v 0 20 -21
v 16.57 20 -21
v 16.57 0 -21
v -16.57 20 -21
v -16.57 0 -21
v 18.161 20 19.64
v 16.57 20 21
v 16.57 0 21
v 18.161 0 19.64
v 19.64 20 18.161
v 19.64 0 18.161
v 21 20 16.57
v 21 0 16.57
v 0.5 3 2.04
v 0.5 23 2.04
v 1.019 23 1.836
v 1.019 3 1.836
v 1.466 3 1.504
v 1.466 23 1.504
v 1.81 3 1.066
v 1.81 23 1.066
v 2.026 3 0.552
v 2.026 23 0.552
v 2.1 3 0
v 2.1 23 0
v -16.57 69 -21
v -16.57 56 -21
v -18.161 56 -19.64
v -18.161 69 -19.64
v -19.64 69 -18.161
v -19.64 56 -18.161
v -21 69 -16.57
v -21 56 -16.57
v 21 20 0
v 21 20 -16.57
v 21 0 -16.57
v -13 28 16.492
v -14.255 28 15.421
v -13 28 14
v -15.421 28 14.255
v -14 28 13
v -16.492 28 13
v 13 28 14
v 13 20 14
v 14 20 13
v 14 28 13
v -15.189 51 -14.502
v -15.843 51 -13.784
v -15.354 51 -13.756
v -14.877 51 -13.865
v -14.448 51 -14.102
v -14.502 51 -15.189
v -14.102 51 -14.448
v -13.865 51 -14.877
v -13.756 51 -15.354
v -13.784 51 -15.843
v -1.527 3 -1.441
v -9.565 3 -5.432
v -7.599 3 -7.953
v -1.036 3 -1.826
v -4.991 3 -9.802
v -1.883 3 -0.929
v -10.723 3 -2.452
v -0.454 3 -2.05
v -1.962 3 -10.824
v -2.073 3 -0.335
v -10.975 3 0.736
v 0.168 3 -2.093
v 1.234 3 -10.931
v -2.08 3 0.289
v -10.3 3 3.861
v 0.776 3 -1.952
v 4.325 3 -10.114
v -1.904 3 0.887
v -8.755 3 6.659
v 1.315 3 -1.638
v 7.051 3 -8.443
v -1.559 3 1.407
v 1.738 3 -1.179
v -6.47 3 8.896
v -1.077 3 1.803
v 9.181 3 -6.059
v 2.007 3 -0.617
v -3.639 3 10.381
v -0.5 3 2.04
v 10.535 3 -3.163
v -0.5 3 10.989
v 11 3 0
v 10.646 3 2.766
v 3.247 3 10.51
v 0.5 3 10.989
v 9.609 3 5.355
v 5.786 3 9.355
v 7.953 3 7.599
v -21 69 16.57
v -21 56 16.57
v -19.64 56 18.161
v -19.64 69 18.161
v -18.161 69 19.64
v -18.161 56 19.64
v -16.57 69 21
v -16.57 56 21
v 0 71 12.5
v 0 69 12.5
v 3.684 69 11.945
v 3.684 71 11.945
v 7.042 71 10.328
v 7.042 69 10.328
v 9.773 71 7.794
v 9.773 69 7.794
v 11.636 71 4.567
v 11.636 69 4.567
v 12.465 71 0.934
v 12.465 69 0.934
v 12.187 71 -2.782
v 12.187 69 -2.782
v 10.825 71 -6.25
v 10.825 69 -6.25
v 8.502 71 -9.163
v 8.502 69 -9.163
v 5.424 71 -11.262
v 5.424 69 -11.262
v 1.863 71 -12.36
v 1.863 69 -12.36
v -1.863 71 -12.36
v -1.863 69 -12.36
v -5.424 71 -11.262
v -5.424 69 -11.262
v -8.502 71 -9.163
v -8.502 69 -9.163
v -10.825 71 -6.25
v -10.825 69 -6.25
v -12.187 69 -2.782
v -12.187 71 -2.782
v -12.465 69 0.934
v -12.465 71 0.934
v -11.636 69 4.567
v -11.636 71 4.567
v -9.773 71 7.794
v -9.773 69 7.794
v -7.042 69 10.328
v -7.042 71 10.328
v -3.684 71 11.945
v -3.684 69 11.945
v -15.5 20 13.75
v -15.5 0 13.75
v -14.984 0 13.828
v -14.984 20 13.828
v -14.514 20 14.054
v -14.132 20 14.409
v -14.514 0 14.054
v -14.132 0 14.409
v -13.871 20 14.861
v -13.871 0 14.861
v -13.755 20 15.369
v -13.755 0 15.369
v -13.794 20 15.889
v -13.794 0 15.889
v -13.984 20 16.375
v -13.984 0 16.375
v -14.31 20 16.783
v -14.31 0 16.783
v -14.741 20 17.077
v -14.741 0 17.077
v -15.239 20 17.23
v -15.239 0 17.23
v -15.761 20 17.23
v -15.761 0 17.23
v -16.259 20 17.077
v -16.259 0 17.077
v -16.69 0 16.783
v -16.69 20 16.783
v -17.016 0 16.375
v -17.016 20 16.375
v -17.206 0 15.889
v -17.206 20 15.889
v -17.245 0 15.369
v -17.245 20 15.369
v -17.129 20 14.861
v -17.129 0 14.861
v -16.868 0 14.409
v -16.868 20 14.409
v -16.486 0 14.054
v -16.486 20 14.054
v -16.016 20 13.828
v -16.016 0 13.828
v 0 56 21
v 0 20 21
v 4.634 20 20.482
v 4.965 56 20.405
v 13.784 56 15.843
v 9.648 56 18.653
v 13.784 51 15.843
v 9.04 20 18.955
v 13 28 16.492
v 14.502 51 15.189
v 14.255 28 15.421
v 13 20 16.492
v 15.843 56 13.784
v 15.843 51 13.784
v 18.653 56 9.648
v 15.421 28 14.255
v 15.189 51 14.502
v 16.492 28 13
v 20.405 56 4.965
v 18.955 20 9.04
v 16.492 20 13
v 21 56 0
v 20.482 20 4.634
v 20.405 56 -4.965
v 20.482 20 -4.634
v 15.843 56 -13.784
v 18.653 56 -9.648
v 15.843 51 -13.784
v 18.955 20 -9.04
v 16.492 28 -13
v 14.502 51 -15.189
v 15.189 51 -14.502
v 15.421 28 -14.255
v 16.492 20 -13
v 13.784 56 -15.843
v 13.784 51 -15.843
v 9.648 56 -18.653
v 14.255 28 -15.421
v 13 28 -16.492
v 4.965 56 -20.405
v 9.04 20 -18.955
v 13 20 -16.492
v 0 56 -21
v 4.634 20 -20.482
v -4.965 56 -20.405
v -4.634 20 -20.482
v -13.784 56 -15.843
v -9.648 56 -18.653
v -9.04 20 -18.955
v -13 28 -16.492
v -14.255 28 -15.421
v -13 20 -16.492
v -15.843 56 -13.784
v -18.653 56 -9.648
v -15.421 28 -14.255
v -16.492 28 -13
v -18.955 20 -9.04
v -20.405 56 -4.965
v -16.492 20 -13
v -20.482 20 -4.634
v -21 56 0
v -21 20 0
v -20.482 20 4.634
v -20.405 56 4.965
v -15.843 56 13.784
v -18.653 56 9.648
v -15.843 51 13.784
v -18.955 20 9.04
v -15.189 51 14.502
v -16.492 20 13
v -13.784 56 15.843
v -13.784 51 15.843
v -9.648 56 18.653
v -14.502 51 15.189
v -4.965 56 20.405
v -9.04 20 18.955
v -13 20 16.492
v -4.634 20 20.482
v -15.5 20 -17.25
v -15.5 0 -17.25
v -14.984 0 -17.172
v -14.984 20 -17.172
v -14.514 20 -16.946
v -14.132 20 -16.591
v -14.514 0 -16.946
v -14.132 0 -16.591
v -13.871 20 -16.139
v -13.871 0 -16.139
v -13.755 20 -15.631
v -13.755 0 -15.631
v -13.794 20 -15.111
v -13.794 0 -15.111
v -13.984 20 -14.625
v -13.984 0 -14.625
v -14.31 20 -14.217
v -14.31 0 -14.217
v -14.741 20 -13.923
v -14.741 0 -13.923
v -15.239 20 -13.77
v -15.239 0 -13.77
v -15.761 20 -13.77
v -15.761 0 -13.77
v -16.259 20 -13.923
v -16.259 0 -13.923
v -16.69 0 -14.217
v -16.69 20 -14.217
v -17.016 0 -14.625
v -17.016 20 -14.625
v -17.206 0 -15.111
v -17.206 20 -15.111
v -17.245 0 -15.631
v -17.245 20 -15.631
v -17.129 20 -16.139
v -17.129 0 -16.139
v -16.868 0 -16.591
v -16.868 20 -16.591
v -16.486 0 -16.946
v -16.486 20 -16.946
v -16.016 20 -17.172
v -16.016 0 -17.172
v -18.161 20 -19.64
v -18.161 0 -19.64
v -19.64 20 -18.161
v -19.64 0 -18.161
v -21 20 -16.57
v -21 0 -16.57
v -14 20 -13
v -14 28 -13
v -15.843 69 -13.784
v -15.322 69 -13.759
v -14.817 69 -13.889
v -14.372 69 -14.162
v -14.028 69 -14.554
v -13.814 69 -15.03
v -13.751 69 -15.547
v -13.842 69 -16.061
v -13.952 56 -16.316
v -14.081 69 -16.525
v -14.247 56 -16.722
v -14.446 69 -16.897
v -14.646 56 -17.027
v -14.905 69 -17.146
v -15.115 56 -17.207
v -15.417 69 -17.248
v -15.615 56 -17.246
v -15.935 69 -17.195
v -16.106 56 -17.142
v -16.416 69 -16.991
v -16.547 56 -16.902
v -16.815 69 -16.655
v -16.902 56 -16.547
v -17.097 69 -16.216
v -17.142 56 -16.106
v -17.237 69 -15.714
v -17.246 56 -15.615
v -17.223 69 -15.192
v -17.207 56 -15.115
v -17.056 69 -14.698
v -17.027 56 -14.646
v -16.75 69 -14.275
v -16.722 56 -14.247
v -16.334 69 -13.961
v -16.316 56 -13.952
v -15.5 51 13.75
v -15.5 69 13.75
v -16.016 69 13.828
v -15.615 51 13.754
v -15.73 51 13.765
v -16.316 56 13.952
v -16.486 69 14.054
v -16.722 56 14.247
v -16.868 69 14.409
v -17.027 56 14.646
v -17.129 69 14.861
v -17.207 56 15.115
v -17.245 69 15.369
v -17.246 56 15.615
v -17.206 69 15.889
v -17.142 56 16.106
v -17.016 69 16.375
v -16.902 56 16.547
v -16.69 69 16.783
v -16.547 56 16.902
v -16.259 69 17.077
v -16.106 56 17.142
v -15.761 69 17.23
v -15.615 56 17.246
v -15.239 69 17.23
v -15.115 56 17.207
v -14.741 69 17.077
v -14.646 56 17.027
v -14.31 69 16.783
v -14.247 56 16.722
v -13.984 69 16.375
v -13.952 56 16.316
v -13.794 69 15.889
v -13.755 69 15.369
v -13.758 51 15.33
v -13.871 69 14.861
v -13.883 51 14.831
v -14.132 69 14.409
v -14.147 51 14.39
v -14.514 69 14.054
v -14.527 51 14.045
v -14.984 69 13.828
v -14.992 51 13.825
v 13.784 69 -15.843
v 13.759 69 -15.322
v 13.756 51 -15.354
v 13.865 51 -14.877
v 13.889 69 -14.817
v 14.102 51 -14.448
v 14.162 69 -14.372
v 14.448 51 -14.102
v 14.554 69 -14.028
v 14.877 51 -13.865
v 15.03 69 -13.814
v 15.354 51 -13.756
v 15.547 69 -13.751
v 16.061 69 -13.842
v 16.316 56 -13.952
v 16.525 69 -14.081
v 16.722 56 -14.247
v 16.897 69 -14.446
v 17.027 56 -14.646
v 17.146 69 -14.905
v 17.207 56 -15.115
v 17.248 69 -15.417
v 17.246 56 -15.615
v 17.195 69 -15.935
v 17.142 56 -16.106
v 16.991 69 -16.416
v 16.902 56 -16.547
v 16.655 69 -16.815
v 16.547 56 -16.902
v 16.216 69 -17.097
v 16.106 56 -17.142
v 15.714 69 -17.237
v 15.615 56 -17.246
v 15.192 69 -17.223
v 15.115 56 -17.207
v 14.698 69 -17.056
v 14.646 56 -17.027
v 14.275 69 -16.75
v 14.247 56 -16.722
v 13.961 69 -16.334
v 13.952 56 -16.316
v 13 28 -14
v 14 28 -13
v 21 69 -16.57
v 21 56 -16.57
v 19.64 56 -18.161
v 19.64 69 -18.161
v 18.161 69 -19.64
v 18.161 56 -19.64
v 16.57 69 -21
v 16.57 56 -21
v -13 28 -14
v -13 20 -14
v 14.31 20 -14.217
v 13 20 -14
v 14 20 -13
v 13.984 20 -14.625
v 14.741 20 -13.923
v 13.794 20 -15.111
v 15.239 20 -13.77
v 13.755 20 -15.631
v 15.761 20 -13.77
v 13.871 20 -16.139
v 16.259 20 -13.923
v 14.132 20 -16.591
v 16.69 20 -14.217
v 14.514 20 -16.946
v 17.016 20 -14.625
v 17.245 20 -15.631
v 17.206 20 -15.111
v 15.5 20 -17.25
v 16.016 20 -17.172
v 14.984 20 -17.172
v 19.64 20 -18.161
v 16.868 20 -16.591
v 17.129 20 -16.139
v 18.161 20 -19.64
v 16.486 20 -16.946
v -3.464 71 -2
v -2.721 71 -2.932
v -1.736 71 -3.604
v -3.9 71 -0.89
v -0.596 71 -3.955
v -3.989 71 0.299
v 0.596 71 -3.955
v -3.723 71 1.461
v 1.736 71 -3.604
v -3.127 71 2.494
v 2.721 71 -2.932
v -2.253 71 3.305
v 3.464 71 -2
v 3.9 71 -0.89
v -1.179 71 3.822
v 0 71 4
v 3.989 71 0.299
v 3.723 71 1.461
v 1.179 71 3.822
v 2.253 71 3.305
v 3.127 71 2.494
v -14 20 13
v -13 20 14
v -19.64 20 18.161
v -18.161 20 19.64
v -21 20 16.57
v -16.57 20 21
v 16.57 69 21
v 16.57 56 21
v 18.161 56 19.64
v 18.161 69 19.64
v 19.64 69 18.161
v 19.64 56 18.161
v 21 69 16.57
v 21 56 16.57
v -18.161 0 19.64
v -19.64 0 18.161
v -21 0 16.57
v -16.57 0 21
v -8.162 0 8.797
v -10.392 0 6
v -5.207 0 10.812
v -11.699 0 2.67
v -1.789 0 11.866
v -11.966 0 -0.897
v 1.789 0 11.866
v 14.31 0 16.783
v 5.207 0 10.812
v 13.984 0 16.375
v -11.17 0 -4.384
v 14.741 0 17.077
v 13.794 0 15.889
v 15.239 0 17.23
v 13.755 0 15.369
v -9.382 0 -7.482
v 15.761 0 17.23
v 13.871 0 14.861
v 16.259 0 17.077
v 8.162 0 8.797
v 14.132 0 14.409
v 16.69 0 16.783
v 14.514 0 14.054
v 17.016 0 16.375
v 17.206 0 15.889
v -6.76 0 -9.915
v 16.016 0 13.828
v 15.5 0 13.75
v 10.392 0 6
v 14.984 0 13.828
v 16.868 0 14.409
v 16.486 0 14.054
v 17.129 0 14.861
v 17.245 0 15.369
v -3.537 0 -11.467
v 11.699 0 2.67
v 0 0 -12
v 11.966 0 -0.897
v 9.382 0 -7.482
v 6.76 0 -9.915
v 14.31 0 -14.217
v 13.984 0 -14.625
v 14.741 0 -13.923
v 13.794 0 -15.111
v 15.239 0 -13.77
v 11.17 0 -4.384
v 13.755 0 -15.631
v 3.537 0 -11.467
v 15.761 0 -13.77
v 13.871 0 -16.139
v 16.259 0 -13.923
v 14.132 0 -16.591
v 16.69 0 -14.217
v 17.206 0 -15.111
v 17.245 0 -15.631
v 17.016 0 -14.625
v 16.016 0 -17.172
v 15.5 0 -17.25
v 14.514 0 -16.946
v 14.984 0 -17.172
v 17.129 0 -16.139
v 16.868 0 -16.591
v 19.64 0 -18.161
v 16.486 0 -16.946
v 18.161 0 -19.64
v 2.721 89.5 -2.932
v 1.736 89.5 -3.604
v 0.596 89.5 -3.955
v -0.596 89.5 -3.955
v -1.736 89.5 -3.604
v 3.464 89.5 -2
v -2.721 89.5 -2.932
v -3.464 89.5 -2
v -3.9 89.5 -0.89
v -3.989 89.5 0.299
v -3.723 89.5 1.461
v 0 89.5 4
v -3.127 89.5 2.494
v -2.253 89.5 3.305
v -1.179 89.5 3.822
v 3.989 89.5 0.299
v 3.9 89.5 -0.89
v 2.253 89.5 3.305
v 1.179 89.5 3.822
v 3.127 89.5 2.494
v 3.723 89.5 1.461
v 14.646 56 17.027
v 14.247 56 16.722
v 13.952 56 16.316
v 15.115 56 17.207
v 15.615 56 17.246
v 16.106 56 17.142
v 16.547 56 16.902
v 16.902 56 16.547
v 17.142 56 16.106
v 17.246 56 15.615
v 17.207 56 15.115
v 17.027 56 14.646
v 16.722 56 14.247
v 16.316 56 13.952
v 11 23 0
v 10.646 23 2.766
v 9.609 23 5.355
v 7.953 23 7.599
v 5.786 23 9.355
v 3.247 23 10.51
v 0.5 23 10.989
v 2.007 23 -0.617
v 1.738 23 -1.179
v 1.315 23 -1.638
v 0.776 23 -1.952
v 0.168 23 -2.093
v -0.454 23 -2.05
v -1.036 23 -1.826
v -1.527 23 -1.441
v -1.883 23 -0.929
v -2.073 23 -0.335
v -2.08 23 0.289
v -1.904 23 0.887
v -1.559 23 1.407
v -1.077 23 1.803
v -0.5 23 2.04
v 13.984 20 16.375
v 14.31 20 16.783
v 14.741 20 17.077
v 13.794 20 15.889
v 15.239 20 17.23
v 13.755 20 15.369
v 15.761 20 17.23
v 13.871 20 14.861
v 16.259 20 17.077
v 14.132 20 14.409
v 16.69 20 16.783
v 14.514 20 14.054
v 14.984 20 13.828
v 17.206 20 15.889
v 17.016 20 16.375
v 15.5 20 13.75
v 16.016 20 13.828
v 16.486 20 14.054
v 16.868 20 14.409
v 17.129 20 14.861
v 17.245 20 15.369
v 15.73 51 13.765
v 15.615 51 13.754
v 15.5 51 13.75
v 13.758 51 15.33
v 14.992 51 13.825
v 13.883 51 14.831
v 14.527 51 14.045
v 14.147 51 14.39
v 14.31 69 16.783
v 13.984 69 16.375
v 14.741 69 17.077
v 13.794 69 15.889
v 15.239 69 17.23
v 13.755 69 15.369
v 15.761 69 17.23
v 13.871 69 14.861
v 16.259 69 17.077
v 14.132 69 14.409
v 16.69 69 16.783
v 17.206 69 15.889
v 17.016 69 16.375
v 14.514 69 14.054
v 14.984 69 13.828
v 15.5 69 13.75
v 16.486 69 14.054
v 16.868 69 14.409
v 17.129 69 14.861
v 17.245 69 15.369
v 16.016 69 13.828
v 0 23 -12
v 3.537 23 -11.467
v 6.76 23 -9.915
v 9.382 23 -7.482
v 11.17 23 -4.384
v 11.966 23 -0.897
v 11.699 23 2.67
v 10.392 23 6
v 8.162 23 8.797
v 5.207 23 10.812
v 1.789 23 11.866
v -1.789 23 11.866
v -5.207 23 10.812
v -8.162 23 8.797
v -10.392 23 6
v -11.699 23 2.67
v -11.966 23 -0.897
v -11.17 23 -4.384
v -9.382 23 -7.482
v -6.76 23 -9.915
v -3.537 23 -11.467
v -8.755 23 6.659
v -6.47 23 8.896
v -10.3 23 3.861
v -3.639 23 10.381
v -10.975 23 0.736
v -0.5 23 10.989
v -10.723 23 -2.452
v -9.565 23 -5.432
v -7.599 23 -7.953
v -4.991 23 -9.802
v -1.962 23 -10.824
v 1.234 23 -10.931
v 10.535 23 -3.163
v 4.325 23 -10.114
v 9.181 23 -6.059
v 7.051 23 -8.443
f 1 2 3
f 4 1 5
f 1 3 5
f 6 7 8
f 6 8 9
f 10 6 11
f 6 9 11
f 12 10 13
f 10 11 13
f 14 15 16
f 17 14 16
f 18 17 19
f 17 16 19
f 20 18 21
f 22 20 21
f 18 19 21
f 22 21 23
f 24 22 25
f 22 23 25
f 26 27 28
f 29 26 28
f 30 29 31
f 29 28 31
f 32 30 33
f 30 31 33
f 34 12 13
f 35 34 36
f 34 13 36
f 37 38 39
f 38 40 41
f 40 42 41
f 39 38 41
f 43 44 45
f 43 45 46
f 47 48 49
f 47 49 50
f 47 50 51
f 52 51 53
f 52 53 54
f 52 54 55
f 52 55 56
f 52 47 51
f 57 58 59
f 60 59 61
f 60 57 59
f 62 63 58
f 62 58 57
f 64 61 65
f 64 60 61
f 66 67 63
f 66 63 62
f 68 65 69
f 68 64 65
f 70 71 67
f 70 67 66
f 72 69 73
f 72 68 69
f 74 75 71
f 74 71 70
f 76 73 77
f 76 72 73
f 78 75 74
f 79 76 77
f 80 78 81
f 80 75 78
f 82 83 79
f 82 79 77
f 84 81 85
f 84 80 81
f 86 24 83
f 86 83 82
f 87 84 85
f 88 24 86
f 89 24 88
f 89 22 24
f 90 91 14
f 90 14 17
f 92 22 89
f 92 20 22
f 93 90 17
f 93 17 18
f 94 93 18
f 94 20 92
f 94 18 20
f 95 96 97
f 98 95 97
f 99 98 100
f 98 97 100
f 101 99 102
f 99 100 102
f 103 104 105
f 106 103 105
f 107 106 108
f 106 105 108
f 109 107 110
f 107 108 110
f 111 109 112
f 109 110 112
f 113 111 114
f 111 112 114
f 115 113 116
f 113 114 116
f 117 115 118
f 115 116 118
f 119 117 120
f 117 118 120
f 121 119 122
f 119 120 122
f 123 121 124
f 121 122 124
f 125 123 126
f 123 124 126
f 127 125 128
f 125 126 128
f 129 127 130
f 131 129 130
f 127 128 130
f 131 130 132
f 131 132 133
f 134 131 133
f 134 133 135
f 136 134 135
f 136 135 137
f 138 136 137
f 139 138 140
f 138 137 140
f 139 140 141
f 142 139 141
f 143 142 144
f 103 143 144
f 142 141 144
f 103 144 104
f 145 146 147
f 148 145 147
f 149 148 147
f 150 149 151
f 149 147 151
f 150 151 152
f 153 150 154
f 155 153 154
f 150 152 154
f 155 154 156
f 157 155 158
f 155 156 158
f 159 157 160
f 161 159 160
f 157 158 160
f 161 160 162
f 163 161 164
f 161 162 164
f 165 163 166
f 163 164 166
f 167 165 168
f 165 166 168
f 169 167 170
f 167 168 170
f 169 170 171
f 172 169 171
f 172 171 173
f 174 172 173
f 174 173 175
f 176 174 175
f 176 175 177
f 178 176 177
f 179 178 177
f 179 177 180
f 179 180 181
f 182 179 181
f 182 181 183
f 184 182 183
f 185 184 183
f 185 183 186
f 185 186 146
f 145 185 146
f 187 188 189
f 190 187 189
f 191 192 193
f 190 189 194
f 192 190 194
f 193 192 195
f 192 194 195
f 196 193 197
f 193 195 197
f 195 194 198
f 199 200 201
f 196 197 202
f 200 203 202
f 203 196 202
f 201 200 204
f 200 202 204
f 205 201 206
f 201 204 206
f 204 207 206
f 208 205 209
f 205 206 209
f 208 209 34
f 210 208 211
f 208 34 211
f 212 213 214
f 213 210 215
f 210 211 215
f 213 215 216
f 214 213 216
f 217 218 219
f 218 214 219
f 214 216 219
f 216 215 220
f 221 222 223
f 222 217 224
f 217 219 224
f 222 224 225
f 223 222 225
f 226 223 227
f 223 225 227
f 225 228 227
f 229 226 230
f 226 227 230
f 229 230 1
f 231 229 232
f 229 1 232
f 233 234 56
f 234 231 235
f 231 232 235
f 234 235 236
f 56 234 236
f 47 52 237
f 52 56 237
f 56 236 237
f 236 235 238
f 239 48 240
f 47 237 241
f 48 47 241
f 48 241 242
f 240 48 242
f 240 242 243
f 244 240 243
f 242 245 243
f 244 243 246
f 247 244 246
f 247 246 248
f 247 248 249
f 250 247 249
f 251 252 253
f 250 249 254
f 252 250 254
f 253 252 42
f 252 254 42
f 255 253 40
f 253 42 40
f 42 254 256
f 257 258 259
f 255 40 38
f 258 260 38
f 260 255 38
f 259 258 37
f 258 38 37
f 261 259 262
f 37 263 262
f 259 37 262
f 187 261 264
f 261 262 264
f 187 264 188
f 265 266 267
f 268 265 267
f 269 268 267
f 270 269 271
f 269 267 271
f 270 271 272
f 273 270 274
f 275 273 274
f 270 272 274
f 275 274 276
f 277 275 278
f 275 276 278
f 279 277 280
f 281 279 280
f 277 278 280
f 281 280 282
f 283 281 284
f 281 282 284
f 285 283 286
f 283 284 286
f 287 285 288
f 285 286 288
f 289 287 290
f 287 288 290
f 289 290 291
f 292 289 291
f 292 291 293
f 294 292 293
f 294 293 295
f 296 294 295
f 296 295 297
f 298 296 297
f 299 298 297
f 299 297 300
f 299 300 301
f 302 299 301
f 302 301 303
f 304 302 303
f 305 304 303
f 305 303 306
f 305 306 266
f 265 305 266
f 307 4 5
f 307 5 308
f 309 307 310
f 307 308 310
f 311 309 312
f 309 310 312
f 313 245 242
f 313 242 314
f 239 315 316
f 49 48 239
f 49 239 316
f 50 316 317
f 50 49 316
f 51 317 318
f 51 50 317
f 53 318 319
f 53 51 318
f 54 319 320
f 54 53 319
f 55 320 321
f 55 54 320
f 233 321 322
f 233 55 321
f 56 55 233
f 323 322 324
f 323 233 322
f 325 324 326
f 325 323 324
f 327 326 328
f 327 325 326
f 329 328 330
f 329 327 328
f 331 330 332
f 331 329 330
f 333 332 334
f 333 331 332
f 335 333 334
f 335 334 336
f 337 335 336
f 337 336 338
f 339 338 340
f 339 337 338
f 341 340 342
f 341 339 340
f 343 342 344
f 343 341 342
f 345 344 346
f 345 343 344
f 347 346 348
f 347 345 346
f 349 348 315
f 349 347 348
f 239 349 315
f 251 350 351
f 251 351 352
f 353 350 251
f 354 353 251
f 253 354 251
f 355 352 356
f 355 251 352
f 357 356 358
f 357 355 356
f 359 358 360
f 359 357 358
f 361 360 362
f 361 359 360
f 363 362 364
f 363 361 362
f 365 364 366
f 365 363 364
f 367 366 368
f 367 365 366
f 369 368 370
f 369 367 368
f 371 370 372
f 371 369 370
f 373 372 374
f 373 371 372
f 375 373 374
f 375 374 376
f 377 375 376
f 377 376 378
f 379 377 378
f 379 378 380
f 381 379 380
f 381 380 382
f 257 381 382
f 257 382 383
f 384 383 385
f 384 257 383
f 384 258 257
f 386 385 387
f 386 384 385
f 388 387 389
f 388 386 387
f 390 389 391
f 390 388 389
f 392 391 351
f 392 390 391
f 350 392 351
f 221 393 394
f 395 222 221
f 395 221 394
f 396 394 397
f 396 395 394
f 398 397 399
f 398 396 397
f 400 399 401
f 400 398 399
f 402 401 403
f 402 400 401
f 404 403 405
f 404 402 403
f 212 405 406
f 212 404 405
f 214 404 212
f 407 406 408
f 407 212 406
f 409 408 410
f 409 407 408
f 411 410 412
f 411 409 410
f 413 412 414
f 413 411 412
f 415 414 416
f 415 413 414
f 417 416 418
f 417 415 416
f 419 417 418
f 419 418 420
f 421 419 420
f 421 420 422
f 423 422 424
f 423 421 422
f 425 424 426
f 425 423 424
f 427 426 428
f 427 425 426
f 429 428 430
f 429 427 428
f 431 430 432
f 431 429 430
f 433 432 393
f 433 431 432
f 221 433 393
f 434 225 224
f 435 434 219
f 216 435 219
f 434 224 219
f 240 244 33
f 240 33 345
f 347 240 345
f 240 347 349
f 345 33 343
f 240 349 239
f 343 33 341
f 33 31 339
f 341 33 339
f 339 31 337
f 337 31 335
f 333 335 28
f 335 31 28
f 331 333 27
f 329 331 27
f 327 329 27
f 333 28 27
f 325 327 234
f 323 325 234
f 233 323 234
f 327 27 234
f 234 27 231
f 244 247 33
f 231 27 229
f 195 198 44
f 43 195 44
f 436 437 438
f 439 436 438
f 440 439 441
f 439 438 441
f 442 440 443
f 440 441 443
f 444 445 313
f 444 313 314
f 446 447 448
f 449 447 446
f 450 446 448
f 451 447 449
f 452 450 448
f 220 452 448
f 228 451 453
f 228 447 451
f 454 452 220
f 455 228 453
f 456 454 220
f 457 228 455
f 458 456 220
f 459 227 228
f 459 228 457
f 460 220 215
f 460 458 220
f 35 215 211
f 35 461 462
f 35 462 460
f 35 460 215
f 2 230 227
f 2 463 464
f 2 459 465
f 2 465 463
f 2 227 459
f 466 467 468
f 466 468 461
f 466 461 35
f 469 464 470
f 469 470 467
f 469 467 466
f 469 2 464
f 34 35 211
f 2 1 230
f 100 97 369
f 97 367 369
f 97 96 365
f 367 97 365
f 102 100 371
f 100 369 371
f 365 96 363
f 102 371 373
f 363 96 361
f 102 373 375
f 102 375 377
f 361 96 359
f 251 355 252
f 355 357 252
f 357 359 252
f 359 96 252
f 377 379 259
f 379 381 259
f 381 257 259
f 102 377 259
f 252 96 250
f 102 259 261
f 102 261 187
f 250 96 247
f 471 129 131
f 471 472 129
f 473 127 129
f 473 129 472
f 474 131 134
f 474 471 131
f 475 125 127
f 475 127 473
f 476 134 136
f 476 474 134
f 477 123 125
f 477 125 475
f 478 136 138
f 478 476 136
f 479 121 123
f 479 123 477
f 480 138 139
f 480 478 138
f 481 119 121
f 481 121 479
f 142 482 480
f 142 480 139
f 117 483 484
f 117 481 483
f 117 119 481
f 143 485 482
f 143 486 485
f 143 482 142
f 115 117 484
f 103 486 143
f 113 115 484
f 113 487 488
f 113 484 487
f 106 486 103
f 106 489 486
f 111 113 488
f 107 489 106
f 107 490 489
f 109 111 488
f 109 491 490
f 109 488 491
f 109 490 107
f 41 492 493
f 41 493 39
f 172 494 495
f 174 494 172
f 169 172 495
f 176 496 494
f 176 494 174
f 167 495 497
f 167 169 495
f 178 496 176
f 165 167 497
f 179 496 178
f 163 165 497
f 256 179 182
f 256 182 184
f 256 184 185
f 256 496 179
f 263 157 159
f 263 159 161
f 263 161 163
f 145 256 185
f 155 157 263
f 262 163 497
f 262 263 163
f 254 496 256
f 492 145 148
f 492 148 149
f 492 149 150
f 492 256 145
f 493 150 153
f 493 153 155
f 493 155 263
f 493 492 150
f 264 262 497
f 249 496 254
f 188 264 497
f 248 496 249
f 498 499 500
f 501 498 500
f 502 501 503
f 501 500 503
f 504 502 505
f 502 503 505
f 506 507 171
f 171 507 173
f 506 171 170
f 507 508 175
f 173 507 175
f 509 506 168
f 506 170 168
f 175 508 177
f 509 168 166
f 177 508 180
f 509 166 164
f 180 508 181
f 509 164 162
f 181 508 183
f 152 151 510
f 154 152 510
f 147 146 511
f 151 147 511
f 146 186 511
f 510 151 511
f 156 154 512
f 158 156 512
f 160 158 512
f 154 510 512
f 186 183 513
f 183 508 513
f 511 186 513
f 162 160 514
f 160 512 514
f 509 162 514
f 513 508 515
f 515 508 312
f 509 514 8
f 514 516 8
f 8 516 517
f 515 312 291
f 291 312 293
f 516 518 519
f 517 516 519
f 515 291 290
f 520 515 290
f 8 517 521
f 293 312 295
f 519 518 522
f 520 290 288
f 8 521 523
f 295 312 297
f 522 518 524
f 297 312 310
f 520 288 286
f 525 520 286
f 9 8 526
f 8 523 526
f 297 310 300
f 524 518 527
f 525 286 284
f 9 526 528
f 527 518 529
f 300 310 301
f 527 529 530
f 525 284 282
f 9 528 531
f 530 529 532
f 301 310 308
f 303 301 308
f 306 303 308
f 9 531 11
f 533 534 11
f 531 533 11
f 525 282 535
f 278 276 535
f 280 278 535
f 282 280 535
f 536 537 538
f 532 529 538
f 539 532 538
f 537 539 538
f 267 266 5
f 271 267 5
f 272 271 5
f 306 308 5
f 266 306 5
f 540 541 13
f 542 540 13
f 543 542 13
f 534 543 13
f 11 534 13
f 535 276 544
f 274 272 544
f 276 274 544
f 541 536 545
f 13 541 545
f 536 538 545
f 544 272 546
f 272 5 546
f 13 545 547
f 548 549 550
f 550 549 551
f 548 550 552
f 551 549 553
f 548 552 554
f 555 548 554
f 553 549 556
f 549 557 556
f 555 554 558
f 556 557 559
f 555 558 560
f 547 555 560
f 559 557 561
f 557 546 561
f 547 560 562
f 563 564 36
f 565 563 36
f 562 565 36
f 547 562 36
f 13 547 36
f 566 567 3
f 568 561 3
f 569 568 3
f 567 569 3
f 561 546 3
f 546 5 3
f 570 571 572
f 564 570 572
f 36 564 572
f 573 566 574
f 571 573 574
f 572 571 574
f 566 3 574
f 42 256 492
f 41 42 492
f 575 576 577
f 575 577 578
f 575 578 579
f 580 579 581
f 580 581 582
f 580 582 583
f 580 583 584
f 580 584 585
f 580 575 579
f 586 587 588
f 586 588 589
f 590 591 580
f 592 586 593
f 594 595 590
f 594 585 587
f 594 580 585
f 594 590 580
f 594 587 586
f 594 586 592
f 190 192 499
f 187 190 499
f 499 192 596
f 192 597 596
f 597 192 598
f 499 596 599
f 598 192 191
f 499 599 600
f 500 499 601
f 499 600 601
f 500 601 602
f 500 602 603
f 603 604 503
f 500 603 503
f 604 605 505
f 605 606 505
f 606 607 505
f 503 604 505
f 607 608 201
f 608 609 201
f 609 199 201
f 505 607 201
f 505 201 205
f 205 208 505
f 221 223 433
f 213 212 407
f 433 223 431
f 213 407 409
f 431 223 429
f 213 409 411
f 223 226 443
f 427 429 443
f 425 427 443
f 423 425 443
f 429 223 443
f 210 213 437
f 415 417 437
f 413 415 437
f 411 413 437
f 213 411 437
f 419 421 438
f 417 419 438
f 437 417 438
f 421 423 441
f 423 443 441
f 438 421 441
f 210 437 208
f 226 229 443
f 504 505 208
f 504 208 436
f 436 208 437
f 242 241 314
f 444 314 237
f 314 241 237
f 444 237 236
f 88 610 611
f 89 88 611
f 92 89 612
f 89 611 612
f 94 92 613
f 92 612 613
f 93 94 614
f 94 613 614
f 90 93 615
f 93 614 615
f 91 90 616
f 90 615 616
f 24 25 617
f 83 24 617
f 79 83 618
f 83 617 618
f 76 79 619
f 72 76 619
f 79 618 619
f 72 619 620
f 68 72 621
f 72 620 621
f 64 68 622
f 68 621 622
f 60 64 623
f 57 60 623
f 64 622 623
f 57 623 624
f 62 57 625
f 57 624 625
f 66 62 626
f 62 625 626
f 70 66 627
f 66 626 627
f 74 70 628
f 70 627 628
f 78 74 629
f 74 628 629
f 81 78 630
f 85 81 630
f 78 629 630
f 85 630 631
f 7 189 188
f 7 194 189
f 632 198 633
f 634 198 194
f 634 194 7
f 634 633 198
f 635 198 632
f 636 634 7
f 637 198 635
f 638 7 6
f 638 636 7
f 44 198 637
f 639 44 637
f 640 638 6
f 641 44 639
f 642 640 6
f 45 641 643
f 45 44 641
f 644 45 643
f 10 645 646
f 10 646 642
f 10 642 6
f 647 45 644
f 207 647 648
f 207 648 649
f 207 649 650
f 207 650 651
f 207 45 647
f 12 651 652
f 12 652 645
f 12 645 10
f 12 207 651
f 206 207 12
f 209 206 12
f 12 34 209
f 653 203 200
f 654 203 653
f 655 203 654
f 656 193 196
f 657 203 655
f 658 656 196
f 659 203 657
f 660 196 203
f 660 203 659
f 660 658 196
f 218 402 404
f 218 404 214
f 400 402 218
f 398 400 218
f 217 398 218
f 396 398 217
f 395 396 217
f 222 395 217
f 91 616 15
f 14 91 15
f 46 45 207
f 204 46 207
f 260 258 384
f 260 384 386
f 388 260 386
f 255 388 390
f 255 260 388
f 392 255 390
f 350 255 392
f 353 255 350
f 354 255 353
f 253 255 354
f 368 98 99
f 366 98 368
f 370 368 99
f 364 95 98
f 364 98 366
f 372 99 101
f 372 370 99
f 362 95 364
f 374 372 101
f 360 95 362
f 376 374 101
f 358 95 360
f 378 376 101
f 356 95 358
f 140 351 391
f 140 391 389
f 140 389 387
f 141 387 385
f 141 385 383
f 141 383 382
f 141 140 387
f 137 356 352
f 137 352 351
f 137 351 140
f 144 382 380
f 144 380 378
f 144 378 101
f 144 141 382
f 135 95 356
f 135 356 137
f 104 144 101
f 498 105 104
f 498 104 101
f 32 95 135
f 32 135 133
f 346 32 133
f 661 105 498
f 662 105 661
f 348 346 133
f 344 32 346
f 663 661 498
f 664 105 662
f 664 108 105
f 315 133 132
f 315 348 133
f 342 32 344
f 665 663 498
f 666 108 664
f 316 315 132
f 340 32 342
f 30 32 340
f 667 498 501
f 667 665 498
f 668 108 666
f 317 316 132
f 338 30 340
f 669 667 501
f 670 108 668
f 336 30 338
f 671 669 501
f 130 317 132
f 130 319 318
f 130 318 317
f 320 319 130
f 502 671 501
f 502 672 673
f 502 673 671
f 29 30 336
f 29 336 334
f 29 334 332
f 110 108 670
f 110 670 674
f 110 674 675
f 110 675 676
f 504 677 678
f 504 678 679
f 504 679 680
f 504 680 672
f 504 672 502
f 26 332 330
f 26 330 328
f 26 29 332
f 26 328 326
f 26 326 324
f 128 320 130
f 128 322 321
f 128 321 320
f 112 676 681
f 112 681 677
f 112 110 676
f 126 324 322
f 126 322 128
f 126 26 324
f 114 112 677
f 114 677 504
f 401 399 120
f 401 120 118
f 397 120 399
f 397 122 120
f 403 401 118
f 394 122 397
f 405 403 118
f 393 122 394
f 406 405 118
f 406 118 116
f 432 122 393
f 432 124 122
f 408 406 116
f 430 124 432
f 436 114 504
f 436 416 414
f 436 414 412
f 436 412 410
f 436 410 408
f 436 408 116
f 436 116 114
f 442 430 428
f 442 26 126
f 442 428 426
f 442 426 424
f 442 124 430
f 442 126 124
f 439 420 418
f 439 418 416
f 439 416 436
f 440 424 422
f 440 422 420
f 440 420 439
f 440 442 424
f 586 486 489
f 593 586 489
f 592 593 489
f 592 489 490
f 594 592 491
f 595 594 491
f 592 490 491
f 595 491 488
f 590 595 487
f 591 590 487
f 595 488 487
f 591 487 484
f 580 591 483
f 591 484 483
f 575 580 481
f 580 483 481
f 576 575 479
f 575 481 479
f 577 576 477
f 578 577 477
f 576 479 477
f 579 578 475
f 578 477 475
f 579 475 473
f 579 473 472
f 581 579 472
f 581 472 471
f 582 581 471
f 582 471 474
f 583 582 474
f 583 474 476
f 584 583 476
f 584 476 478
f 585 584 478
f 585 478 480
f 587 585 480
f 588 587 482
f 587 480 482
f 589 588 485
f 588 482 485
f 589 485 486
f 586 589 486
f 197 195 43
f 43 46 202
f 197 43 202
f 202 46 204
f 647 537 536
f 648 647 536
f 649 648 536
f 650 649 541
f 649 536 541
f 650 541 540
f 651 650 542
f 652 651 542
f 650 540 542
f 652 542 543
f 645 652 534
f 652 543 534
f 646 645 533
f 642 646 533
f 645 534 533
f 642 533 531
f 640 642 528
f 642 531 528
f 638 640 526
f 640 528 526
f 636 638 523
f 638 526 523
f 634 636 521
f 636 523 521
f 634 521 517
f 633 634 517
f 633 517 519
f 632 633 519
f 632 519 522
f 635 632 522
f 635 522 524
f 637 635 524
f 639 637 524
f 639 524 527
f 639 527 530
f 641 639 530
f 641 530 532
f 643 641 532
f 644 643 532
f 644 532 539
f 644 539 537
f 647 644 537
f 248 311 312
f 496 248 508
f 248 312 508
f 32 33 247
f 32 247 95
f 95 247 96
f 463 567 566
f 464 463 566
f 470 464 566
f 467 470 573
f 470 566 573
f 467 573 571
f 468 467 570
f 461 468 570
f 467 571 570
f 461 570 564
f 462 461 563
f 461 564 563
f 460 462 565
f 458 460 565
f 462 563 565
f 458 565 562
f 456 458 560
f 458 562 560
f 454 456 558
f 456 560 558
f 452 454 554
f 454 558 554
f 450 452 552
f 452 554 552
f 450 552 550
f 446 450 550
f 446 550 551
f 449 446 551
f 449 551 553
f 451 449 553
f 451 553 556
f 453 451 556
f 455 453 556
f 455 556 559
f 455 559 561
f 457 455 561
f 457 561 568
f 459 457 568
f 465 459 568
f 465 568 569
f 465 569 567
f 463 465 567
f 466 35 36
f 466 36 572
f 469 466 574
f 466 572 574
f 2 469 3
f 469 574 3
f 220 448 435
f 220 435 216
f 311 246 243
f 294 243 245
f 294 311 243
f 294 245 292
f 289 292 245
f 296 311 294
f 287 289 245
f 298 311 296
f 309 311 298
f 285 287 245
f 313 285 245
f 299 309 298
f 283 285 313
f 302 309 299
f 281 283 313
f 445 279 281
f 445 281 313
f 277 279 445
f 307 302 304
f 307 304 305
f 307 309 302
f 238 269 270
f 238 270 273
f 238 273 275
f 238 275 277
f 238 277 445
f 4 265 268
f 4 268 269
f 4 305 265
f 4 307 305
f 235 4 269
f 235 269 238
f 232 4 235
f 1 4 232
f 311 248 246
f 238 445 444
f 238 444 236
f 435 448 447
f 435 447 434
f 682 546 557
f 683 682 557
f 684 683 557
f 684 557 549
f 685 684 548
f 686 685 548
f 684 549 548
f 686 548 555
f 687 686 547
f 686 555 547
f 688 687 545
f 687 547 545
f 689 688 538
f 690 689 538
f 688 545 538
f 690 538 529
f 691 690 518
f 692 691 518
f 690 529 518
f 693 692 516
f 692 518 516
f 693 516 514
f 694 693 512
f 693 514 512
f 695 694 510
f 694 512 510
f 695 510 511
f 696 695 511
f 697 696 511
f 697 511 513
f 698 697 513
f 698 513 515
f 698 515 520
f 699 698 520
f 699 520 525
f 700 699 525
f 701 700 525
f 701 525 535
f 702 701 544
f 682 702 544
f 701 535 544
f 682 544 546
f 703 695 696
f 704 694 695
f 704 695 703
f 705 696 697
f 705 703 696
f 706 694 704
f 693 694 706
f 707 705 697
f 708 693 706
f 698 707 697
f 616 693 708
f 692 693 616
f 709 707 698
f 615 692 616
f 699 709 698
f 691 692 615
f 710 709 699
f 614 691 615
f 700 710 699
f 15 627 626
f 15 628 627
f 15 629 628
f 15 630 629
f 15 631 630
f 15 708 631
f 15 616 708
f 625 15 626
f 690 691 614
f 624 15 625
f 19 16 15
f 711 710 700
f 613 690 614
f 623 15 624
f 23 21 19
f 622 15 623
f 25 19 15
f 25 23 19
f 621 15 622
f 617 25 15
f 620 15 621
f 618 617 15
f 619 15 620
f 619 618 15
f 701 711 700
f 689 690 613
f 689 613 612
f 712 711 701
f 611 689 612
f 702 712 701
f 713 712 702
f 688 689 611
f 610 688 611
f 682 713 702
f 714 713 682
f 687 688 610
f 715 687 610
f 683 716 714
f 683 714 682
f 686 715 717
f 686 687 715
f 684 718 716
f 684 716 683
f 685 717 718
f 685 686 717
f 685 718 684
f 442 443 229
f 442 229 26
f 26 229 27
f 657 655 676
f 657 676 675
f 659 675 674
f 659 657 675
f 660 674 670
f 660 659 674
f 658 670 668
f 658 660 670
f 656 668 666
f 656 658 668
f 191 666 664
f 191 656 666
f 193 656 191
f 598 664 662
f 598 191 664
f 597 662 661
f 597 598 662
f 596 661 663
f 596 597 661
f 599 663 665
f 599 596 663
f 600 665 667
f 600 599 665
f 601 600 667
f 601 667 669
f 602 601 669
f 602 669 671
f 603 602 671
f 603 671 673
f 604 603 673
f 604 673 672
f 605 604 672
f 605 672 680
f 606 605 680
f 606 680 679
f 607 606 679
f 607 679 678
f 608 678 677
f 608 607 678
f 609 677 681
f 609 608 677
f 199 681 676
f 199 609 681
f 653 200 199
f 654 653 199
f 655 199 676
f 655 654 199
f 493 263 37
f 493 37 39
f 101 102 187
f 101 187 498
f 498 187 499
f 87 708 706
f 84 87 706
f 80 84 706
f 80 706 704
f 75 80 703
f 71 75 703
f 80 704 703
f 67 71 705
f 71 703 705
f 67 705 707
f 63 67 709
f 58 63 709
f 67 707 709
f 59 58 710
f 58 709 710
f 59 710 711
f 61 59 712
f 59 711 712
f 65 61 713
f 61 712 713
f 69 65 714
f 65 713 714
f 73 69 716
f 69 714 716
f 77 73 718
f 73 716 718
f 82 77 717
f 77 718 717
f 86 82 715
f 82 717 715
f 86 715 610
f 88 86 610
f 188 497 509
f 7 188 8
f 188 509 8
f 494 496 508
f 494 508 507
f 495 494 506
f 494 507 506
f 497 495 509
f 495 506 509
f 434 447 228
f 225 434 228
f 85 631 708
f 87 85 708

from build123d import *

# Parameters (mm, degrees)
EXTRUDE_1_DEPTH     = 20
SKETCH_2_R          = 21
EXTRUDE_2_DEPTH     = 49
SKETCH_3_R          = 12.5
EXTRUDE_3_DEPTH     = 2
SKETCH_4_R          = 4
EXTRUDE_4_DEPTH     = 18.5
SKETCH_5_R          = 1.75
CUT_EXTRUDE_1_DEPTH = 22.5
SKETCH_6_W          = 5
SKETCH_6_H          = 5
CUT_EXTRUDE_2_DEPTH = 8
CHAMFER_1_SIZE      = 1
SKETCH_7_R          = 12
CUT_EXTRUDE_3_DEPTH = 23
EXTRUDE_5_DEPTH     = 20
EXTRUDE_START       = -13
SKETCH_9_R          = 1.75
SKETCH_9_R_2        = 12
EXTRUDE_6_DEPTH     = 13
CUT_EXTRUDE_START   = -18
SKETCH_10_R         = 1.75
CUT_EXTRUDE_4_DEPTH = 18


with BuildPart() as part:
    # 草图1 → 凸台-拉伸1 (new body)
    with BuildSketch(Plane(origin=(0, 0, 0), x_dir=(1, 0, 0), z_dir=(0, 1, 0))):
        with BuildLine():
            Line((16.56992758, 21), (-16.56992758, 21))
            ThreePointArc((-16.56992758, 21), (-18.915106397, 18.915106397), (-21, 16.56992758))
            Line((-21, 16.56992758), (-21, -16.56992758))
            ThreePointArc((-21, -16.56992758), (-18.915106397, -18.915106397), (-16.56992758, -21))
            Line((-16.56992758, -21), (16.56992758, -21))
            ThreePointArc((16.56992758, -21), (18.915106397, -18.915106397), (21, -16.56992758))
            Line((21, -16.56992758), (21, 16.56992758))
            ThreePointArc((21, 16.56992758), (18.915106397, 18.915106397), (16.56992758, 21))
        make_face()
    extrude(amount=EXTRUDE_1_DEPTH)

    # 草图2 → 凸台-拉伸2 (add)
    with BuildSketch(Plane(origin=(0, 20, 0), x_dir=(1, 0, 0), z_dir=(0, 1, 0))):
        with Locations(Location((0, 0, 0), (0, 0, 270))):
            Circle(SKETCH_2_R)
    extrude(amount=EXTRUDE_2_DEPTH)

    # 草图3 → 凸台-拉伸3 (add)
    with BuildSketch(Plane(origin=(0, 69, 0), x_dir=(1, 0, 0), z_dir=(0, 1, 0))):
        with Locations(Location((0, 0, 0), (0, 0, 270))):
            Circle(SKETCH_3_R)
    extrude(amount=EXTRUDE_3_DEPTH)

    # 草图4 → 凸台-拉伸4 (add)
    with BuildSketch(Plane(origin=(0, 71, 0), x_dir=(1, 0, 0), z_dir=(0, 1, 0))):
        with Locations(Location((0, 0, 0), (0, 0, 270))):
            Circle(SKETCH_4_R)
    extrude(amount=EXTRUDE_4_DEPTH)

    # 草图5 → 切除-拉伸1 (cut)
    with BuildSketch(Plane.XZ):
        with Locations(Location((15.5, 15.5, 0), (0, 0, 270))):
            Circle(SKETCH_5_R)
        with Locations(Location((15.5, -15.5, 0), (0, 0, 270))):
            Circle(SKETCH_5_R)
        with Locations(Location((-15.5, -15.5, 0), (0, 0, 270))):
            Circle(SKETCH_5_R)
        with Locations(Location((-15.5, 15.5, 0), (0, 0, 270))):
            Circle(SKETCH_5_R)
    extrude(amount=-CUT_EXTRUDE_1_DEPTH, mode=Mode.SUBTRACT)

    # 草图6 → 切除-拉伸2 (cut)
    with BuildSketch(Plane(origin=(0, 20, 0), x_dir=(1, 0, 0), z_dir=(0, 1, 0))):
        with Locations((-15.5, -15.5)):
            Rectangle(SKETCH_6_W, SKETCH_6_H)
        with Locations((15.5, -15.5)):
            Rectangle(SKETCH_6_W, SKETCH_6_H)
        with Locations((-15.5, 15.5)):
            Rectangle(SKETCH_6_W, SKETCH_6_H)
        with Locations((15.5, 15.5)):
            Rectangle(SKETCH_6_W, SKETCH_6_H)
    extrude(amount=CUT_EXTRUDE_2_DEPTH, mode=Mode.SUBTRACT)

    # 倒角1
    chamfer_1_edges = [part.edges().sort_by_distance(p)[0] for p in [
        (13, 24, -13),
        (-13, 24, -13),
        (-13, 24, 13),
        (13, 24, 13),
    ]]
    chamfer(chamfer_1_edges, length=CHAMFER_1_SIZE)

    # 草图7 → 切除-拉伸3 (cut)
    with BuildSketch(Plane.XZ):
        with Locations(Location((0, 0, 0), (0, 0, 270))):
            Circle(SKETCH_7_R)
    extrude(amount=-CUT_EXTRUDE_3_DEPTH, mode=Mode.SUBTRACT)

    # 草图8 → 凸台-拉伸5 (add)
    with BuildSketch(Plane.XZ.offset(-23)):
        with BuildLine():
            ThreePointArc((2.1, 0), (-1.29614814, -1.652271164), (-0.5, 2.039607805))
            Line((-0.5, 2.039607805), (-0.5, 10.988630488))
            ThreePointArc((-0.5, 10.988630488), (-7.599342077, -7.95298686), (11, 0))
            ThreePointArc((11, 0), (7.95298686, 7.599342077), (0.5, 10.988630488))
            Line((0.5, 10.988630488), (0.5, 2.039607805))
            ThreePointArc((0.5, 2.039607805), (1.652271164, 1.29614814), (2.1, 0))
        make_face()
    extrude(amount=EXTRUDE_5_DEPTH)

    # 草图9 → 凸台-拉伸6 (add)
    with BuildSketch(Plane(origin=(0, 69, 0), x_dir=(1, 0, 0), z_dir=(0, 1, 0)).offset(EXTRUDE_START)):
        with BuildLine():
            Line((-16.56992758, -21), (16.56992758, -21))
            ThreePointArc((16.56992758, -21), (18.915106397, -18.915106397), (21, -16.56992758))
            Line((21, -16.56992758), (21, 16.56992758))
            ThreePointArc((21, 16.56992758), (18.915106397, 18.915106397), (16.56992758, 21))
            Line((16.56992758, 21), (-16.56992758, 21))
            ThreePointArc((-16.56992758, 21), (-18.915106397, 18.915106397), (-21, 16.56992758))
            Line((-21, 16.56992758), (-21, -16.56992758))
            ThreePointArc((-21, -16.56992758), (-18.915106397, -18.915106397), (-16.56992758, -21))
        make_face()
        with Locations(Location((15.5, 15.5, 0), (0, 0, 90))):
            Circle(SKETCH_9_R, mode=Mode.SUBTRACT)
        with Locations(Location((15.5, -15.5, 0), (0, 0, 90))):
            Circle(SKETCH_9_R, mode=Mode.SUBTRACT)
        with Locations(Location((-15.5, 15.5, 0), (0, 0, 90))):
            Circle(SKETCH_9_R, mode=Mode.SUBTRACT)
        with Locations(Location((-15.5, -15.5, 0), (0, 0, 90))):
            Circle(SKETCH_9_R, mode=Mode.SUBTRACT)
        with Locations(Location((0, 0, 0), (0, 0, 90))):
            Circle(SKETCH_9_R_2, mode=Mode.SUBTRACT)
    extrude(amount=EXTRUDE_6_DEPTH)

    # 草图10 → 切除-拉伸4 (cut)
    with BuildSketch(Plane(origin=(0, 69, 0), x_dir=(1, 0, 0), z_dir=(0, 1, 0)).offset(CUT_EXTRUDE_START)):
        with Locations(Location((15.5, -15.5, 0), (0, 0, 90))):
            Circle(SKETCH_10_R)
        with Locations(Location((-15.5, -15.5, 0), (0, 0, 90))):
            Circle(SKETCH_10_R)
        with Locations(Location((-15.5, 15.5, 0), (0, 0, 90))):
            Circle(SKETCH_10_R)
        with Locations(Location((15.5, 15.5, 0), (0, 0, 90))):
            Circle(SKETCH_10_R)
    extrude(amount=CUT_EXTRUDE_4_DEPTH, mode=Mode.SUBTRACT)


solid = part.part
